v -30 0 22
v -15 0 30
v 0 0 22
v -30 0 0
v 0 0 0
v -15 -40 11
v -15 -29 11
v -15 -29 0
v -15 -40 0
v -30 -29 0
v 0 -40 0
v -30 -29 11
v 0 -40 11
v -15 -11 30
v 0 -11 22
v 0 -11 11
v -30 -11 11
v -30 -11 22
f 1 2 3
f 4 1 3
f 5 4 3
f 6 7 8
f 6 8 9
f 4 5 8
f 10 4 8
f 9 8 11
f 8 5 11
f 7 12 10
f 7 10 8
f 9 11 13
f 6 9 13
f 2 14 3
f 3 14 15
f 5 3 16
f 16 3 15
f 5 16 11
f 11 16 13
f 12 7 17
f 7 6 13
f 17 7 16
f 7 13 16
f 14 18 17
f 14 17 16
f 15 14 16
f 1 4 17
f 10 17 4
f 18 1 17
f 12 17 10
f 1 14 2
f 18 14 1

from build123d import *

# Parameters (mm, degrees)
F1_DEPTH  = 30
F2_W      = 11
F2_H      = 15
F3_DEPTH  = 11
F4_W      = 15
F4_H      = 8
F5_DEPTH  = 11
F6_ANGLE  = -90
F8_DEPTH  = 11
F10_DEPTH = 11


with BuildPart() as f1:
    # F0 (on Front) → F1 (new body)
    with BuildSketch(Plane.XZ):
        Polygon((0, 30), (0, 0), (40, 0), (40, 11), (11, 11), (11, 30), align=None)
    extrude(amount=F1_DEPTH)

    # F2 (on face) → F3 (cut, through all)
    with BuildSketch(Plane.XY.offset(11)):
        with Locations((34.5, -22.5)):
            Rectangle(F2_W, F2_H)
    extrude(amount=-F3_DEPTH, mode=Mode.SUBTRACT)

    # F4 (on face) → F5 (cut, through all)
    with BuildSketch(Plane.YZ.offset(11)):
        with Locations((-22.5, 26)):
            Rectangle(F4_W, F4_H)
    extrude(amount=-F5_DEPTH, mode=Mode.SUBTRACT)


with BuildPart() as f1_1:
    # F6: moved
    add(f1.part.rotate(Axis((0, 0, 15), (0, 0, 1)), F6_ANGLE))

    # F7 (on face) → F8 (join, through all)
    with BuildSketch(Plane.XZ.offset(11)):
        Polygon((-15, 22), (-15, 30), (-30, 22), align=None)
    extrude(amount=-F8_DEPTH)

    # F9 (on face) → F10 (cut, through all)
    with BuildSketch(Plane.XZ.offset(11)):
        Polygon((0, 30), (-15, 30), (0, 22), align=None)
    extrude(amount=-F10_DEPTH, mode=Mode.SUBTRACT)


solid = f1_1.part
